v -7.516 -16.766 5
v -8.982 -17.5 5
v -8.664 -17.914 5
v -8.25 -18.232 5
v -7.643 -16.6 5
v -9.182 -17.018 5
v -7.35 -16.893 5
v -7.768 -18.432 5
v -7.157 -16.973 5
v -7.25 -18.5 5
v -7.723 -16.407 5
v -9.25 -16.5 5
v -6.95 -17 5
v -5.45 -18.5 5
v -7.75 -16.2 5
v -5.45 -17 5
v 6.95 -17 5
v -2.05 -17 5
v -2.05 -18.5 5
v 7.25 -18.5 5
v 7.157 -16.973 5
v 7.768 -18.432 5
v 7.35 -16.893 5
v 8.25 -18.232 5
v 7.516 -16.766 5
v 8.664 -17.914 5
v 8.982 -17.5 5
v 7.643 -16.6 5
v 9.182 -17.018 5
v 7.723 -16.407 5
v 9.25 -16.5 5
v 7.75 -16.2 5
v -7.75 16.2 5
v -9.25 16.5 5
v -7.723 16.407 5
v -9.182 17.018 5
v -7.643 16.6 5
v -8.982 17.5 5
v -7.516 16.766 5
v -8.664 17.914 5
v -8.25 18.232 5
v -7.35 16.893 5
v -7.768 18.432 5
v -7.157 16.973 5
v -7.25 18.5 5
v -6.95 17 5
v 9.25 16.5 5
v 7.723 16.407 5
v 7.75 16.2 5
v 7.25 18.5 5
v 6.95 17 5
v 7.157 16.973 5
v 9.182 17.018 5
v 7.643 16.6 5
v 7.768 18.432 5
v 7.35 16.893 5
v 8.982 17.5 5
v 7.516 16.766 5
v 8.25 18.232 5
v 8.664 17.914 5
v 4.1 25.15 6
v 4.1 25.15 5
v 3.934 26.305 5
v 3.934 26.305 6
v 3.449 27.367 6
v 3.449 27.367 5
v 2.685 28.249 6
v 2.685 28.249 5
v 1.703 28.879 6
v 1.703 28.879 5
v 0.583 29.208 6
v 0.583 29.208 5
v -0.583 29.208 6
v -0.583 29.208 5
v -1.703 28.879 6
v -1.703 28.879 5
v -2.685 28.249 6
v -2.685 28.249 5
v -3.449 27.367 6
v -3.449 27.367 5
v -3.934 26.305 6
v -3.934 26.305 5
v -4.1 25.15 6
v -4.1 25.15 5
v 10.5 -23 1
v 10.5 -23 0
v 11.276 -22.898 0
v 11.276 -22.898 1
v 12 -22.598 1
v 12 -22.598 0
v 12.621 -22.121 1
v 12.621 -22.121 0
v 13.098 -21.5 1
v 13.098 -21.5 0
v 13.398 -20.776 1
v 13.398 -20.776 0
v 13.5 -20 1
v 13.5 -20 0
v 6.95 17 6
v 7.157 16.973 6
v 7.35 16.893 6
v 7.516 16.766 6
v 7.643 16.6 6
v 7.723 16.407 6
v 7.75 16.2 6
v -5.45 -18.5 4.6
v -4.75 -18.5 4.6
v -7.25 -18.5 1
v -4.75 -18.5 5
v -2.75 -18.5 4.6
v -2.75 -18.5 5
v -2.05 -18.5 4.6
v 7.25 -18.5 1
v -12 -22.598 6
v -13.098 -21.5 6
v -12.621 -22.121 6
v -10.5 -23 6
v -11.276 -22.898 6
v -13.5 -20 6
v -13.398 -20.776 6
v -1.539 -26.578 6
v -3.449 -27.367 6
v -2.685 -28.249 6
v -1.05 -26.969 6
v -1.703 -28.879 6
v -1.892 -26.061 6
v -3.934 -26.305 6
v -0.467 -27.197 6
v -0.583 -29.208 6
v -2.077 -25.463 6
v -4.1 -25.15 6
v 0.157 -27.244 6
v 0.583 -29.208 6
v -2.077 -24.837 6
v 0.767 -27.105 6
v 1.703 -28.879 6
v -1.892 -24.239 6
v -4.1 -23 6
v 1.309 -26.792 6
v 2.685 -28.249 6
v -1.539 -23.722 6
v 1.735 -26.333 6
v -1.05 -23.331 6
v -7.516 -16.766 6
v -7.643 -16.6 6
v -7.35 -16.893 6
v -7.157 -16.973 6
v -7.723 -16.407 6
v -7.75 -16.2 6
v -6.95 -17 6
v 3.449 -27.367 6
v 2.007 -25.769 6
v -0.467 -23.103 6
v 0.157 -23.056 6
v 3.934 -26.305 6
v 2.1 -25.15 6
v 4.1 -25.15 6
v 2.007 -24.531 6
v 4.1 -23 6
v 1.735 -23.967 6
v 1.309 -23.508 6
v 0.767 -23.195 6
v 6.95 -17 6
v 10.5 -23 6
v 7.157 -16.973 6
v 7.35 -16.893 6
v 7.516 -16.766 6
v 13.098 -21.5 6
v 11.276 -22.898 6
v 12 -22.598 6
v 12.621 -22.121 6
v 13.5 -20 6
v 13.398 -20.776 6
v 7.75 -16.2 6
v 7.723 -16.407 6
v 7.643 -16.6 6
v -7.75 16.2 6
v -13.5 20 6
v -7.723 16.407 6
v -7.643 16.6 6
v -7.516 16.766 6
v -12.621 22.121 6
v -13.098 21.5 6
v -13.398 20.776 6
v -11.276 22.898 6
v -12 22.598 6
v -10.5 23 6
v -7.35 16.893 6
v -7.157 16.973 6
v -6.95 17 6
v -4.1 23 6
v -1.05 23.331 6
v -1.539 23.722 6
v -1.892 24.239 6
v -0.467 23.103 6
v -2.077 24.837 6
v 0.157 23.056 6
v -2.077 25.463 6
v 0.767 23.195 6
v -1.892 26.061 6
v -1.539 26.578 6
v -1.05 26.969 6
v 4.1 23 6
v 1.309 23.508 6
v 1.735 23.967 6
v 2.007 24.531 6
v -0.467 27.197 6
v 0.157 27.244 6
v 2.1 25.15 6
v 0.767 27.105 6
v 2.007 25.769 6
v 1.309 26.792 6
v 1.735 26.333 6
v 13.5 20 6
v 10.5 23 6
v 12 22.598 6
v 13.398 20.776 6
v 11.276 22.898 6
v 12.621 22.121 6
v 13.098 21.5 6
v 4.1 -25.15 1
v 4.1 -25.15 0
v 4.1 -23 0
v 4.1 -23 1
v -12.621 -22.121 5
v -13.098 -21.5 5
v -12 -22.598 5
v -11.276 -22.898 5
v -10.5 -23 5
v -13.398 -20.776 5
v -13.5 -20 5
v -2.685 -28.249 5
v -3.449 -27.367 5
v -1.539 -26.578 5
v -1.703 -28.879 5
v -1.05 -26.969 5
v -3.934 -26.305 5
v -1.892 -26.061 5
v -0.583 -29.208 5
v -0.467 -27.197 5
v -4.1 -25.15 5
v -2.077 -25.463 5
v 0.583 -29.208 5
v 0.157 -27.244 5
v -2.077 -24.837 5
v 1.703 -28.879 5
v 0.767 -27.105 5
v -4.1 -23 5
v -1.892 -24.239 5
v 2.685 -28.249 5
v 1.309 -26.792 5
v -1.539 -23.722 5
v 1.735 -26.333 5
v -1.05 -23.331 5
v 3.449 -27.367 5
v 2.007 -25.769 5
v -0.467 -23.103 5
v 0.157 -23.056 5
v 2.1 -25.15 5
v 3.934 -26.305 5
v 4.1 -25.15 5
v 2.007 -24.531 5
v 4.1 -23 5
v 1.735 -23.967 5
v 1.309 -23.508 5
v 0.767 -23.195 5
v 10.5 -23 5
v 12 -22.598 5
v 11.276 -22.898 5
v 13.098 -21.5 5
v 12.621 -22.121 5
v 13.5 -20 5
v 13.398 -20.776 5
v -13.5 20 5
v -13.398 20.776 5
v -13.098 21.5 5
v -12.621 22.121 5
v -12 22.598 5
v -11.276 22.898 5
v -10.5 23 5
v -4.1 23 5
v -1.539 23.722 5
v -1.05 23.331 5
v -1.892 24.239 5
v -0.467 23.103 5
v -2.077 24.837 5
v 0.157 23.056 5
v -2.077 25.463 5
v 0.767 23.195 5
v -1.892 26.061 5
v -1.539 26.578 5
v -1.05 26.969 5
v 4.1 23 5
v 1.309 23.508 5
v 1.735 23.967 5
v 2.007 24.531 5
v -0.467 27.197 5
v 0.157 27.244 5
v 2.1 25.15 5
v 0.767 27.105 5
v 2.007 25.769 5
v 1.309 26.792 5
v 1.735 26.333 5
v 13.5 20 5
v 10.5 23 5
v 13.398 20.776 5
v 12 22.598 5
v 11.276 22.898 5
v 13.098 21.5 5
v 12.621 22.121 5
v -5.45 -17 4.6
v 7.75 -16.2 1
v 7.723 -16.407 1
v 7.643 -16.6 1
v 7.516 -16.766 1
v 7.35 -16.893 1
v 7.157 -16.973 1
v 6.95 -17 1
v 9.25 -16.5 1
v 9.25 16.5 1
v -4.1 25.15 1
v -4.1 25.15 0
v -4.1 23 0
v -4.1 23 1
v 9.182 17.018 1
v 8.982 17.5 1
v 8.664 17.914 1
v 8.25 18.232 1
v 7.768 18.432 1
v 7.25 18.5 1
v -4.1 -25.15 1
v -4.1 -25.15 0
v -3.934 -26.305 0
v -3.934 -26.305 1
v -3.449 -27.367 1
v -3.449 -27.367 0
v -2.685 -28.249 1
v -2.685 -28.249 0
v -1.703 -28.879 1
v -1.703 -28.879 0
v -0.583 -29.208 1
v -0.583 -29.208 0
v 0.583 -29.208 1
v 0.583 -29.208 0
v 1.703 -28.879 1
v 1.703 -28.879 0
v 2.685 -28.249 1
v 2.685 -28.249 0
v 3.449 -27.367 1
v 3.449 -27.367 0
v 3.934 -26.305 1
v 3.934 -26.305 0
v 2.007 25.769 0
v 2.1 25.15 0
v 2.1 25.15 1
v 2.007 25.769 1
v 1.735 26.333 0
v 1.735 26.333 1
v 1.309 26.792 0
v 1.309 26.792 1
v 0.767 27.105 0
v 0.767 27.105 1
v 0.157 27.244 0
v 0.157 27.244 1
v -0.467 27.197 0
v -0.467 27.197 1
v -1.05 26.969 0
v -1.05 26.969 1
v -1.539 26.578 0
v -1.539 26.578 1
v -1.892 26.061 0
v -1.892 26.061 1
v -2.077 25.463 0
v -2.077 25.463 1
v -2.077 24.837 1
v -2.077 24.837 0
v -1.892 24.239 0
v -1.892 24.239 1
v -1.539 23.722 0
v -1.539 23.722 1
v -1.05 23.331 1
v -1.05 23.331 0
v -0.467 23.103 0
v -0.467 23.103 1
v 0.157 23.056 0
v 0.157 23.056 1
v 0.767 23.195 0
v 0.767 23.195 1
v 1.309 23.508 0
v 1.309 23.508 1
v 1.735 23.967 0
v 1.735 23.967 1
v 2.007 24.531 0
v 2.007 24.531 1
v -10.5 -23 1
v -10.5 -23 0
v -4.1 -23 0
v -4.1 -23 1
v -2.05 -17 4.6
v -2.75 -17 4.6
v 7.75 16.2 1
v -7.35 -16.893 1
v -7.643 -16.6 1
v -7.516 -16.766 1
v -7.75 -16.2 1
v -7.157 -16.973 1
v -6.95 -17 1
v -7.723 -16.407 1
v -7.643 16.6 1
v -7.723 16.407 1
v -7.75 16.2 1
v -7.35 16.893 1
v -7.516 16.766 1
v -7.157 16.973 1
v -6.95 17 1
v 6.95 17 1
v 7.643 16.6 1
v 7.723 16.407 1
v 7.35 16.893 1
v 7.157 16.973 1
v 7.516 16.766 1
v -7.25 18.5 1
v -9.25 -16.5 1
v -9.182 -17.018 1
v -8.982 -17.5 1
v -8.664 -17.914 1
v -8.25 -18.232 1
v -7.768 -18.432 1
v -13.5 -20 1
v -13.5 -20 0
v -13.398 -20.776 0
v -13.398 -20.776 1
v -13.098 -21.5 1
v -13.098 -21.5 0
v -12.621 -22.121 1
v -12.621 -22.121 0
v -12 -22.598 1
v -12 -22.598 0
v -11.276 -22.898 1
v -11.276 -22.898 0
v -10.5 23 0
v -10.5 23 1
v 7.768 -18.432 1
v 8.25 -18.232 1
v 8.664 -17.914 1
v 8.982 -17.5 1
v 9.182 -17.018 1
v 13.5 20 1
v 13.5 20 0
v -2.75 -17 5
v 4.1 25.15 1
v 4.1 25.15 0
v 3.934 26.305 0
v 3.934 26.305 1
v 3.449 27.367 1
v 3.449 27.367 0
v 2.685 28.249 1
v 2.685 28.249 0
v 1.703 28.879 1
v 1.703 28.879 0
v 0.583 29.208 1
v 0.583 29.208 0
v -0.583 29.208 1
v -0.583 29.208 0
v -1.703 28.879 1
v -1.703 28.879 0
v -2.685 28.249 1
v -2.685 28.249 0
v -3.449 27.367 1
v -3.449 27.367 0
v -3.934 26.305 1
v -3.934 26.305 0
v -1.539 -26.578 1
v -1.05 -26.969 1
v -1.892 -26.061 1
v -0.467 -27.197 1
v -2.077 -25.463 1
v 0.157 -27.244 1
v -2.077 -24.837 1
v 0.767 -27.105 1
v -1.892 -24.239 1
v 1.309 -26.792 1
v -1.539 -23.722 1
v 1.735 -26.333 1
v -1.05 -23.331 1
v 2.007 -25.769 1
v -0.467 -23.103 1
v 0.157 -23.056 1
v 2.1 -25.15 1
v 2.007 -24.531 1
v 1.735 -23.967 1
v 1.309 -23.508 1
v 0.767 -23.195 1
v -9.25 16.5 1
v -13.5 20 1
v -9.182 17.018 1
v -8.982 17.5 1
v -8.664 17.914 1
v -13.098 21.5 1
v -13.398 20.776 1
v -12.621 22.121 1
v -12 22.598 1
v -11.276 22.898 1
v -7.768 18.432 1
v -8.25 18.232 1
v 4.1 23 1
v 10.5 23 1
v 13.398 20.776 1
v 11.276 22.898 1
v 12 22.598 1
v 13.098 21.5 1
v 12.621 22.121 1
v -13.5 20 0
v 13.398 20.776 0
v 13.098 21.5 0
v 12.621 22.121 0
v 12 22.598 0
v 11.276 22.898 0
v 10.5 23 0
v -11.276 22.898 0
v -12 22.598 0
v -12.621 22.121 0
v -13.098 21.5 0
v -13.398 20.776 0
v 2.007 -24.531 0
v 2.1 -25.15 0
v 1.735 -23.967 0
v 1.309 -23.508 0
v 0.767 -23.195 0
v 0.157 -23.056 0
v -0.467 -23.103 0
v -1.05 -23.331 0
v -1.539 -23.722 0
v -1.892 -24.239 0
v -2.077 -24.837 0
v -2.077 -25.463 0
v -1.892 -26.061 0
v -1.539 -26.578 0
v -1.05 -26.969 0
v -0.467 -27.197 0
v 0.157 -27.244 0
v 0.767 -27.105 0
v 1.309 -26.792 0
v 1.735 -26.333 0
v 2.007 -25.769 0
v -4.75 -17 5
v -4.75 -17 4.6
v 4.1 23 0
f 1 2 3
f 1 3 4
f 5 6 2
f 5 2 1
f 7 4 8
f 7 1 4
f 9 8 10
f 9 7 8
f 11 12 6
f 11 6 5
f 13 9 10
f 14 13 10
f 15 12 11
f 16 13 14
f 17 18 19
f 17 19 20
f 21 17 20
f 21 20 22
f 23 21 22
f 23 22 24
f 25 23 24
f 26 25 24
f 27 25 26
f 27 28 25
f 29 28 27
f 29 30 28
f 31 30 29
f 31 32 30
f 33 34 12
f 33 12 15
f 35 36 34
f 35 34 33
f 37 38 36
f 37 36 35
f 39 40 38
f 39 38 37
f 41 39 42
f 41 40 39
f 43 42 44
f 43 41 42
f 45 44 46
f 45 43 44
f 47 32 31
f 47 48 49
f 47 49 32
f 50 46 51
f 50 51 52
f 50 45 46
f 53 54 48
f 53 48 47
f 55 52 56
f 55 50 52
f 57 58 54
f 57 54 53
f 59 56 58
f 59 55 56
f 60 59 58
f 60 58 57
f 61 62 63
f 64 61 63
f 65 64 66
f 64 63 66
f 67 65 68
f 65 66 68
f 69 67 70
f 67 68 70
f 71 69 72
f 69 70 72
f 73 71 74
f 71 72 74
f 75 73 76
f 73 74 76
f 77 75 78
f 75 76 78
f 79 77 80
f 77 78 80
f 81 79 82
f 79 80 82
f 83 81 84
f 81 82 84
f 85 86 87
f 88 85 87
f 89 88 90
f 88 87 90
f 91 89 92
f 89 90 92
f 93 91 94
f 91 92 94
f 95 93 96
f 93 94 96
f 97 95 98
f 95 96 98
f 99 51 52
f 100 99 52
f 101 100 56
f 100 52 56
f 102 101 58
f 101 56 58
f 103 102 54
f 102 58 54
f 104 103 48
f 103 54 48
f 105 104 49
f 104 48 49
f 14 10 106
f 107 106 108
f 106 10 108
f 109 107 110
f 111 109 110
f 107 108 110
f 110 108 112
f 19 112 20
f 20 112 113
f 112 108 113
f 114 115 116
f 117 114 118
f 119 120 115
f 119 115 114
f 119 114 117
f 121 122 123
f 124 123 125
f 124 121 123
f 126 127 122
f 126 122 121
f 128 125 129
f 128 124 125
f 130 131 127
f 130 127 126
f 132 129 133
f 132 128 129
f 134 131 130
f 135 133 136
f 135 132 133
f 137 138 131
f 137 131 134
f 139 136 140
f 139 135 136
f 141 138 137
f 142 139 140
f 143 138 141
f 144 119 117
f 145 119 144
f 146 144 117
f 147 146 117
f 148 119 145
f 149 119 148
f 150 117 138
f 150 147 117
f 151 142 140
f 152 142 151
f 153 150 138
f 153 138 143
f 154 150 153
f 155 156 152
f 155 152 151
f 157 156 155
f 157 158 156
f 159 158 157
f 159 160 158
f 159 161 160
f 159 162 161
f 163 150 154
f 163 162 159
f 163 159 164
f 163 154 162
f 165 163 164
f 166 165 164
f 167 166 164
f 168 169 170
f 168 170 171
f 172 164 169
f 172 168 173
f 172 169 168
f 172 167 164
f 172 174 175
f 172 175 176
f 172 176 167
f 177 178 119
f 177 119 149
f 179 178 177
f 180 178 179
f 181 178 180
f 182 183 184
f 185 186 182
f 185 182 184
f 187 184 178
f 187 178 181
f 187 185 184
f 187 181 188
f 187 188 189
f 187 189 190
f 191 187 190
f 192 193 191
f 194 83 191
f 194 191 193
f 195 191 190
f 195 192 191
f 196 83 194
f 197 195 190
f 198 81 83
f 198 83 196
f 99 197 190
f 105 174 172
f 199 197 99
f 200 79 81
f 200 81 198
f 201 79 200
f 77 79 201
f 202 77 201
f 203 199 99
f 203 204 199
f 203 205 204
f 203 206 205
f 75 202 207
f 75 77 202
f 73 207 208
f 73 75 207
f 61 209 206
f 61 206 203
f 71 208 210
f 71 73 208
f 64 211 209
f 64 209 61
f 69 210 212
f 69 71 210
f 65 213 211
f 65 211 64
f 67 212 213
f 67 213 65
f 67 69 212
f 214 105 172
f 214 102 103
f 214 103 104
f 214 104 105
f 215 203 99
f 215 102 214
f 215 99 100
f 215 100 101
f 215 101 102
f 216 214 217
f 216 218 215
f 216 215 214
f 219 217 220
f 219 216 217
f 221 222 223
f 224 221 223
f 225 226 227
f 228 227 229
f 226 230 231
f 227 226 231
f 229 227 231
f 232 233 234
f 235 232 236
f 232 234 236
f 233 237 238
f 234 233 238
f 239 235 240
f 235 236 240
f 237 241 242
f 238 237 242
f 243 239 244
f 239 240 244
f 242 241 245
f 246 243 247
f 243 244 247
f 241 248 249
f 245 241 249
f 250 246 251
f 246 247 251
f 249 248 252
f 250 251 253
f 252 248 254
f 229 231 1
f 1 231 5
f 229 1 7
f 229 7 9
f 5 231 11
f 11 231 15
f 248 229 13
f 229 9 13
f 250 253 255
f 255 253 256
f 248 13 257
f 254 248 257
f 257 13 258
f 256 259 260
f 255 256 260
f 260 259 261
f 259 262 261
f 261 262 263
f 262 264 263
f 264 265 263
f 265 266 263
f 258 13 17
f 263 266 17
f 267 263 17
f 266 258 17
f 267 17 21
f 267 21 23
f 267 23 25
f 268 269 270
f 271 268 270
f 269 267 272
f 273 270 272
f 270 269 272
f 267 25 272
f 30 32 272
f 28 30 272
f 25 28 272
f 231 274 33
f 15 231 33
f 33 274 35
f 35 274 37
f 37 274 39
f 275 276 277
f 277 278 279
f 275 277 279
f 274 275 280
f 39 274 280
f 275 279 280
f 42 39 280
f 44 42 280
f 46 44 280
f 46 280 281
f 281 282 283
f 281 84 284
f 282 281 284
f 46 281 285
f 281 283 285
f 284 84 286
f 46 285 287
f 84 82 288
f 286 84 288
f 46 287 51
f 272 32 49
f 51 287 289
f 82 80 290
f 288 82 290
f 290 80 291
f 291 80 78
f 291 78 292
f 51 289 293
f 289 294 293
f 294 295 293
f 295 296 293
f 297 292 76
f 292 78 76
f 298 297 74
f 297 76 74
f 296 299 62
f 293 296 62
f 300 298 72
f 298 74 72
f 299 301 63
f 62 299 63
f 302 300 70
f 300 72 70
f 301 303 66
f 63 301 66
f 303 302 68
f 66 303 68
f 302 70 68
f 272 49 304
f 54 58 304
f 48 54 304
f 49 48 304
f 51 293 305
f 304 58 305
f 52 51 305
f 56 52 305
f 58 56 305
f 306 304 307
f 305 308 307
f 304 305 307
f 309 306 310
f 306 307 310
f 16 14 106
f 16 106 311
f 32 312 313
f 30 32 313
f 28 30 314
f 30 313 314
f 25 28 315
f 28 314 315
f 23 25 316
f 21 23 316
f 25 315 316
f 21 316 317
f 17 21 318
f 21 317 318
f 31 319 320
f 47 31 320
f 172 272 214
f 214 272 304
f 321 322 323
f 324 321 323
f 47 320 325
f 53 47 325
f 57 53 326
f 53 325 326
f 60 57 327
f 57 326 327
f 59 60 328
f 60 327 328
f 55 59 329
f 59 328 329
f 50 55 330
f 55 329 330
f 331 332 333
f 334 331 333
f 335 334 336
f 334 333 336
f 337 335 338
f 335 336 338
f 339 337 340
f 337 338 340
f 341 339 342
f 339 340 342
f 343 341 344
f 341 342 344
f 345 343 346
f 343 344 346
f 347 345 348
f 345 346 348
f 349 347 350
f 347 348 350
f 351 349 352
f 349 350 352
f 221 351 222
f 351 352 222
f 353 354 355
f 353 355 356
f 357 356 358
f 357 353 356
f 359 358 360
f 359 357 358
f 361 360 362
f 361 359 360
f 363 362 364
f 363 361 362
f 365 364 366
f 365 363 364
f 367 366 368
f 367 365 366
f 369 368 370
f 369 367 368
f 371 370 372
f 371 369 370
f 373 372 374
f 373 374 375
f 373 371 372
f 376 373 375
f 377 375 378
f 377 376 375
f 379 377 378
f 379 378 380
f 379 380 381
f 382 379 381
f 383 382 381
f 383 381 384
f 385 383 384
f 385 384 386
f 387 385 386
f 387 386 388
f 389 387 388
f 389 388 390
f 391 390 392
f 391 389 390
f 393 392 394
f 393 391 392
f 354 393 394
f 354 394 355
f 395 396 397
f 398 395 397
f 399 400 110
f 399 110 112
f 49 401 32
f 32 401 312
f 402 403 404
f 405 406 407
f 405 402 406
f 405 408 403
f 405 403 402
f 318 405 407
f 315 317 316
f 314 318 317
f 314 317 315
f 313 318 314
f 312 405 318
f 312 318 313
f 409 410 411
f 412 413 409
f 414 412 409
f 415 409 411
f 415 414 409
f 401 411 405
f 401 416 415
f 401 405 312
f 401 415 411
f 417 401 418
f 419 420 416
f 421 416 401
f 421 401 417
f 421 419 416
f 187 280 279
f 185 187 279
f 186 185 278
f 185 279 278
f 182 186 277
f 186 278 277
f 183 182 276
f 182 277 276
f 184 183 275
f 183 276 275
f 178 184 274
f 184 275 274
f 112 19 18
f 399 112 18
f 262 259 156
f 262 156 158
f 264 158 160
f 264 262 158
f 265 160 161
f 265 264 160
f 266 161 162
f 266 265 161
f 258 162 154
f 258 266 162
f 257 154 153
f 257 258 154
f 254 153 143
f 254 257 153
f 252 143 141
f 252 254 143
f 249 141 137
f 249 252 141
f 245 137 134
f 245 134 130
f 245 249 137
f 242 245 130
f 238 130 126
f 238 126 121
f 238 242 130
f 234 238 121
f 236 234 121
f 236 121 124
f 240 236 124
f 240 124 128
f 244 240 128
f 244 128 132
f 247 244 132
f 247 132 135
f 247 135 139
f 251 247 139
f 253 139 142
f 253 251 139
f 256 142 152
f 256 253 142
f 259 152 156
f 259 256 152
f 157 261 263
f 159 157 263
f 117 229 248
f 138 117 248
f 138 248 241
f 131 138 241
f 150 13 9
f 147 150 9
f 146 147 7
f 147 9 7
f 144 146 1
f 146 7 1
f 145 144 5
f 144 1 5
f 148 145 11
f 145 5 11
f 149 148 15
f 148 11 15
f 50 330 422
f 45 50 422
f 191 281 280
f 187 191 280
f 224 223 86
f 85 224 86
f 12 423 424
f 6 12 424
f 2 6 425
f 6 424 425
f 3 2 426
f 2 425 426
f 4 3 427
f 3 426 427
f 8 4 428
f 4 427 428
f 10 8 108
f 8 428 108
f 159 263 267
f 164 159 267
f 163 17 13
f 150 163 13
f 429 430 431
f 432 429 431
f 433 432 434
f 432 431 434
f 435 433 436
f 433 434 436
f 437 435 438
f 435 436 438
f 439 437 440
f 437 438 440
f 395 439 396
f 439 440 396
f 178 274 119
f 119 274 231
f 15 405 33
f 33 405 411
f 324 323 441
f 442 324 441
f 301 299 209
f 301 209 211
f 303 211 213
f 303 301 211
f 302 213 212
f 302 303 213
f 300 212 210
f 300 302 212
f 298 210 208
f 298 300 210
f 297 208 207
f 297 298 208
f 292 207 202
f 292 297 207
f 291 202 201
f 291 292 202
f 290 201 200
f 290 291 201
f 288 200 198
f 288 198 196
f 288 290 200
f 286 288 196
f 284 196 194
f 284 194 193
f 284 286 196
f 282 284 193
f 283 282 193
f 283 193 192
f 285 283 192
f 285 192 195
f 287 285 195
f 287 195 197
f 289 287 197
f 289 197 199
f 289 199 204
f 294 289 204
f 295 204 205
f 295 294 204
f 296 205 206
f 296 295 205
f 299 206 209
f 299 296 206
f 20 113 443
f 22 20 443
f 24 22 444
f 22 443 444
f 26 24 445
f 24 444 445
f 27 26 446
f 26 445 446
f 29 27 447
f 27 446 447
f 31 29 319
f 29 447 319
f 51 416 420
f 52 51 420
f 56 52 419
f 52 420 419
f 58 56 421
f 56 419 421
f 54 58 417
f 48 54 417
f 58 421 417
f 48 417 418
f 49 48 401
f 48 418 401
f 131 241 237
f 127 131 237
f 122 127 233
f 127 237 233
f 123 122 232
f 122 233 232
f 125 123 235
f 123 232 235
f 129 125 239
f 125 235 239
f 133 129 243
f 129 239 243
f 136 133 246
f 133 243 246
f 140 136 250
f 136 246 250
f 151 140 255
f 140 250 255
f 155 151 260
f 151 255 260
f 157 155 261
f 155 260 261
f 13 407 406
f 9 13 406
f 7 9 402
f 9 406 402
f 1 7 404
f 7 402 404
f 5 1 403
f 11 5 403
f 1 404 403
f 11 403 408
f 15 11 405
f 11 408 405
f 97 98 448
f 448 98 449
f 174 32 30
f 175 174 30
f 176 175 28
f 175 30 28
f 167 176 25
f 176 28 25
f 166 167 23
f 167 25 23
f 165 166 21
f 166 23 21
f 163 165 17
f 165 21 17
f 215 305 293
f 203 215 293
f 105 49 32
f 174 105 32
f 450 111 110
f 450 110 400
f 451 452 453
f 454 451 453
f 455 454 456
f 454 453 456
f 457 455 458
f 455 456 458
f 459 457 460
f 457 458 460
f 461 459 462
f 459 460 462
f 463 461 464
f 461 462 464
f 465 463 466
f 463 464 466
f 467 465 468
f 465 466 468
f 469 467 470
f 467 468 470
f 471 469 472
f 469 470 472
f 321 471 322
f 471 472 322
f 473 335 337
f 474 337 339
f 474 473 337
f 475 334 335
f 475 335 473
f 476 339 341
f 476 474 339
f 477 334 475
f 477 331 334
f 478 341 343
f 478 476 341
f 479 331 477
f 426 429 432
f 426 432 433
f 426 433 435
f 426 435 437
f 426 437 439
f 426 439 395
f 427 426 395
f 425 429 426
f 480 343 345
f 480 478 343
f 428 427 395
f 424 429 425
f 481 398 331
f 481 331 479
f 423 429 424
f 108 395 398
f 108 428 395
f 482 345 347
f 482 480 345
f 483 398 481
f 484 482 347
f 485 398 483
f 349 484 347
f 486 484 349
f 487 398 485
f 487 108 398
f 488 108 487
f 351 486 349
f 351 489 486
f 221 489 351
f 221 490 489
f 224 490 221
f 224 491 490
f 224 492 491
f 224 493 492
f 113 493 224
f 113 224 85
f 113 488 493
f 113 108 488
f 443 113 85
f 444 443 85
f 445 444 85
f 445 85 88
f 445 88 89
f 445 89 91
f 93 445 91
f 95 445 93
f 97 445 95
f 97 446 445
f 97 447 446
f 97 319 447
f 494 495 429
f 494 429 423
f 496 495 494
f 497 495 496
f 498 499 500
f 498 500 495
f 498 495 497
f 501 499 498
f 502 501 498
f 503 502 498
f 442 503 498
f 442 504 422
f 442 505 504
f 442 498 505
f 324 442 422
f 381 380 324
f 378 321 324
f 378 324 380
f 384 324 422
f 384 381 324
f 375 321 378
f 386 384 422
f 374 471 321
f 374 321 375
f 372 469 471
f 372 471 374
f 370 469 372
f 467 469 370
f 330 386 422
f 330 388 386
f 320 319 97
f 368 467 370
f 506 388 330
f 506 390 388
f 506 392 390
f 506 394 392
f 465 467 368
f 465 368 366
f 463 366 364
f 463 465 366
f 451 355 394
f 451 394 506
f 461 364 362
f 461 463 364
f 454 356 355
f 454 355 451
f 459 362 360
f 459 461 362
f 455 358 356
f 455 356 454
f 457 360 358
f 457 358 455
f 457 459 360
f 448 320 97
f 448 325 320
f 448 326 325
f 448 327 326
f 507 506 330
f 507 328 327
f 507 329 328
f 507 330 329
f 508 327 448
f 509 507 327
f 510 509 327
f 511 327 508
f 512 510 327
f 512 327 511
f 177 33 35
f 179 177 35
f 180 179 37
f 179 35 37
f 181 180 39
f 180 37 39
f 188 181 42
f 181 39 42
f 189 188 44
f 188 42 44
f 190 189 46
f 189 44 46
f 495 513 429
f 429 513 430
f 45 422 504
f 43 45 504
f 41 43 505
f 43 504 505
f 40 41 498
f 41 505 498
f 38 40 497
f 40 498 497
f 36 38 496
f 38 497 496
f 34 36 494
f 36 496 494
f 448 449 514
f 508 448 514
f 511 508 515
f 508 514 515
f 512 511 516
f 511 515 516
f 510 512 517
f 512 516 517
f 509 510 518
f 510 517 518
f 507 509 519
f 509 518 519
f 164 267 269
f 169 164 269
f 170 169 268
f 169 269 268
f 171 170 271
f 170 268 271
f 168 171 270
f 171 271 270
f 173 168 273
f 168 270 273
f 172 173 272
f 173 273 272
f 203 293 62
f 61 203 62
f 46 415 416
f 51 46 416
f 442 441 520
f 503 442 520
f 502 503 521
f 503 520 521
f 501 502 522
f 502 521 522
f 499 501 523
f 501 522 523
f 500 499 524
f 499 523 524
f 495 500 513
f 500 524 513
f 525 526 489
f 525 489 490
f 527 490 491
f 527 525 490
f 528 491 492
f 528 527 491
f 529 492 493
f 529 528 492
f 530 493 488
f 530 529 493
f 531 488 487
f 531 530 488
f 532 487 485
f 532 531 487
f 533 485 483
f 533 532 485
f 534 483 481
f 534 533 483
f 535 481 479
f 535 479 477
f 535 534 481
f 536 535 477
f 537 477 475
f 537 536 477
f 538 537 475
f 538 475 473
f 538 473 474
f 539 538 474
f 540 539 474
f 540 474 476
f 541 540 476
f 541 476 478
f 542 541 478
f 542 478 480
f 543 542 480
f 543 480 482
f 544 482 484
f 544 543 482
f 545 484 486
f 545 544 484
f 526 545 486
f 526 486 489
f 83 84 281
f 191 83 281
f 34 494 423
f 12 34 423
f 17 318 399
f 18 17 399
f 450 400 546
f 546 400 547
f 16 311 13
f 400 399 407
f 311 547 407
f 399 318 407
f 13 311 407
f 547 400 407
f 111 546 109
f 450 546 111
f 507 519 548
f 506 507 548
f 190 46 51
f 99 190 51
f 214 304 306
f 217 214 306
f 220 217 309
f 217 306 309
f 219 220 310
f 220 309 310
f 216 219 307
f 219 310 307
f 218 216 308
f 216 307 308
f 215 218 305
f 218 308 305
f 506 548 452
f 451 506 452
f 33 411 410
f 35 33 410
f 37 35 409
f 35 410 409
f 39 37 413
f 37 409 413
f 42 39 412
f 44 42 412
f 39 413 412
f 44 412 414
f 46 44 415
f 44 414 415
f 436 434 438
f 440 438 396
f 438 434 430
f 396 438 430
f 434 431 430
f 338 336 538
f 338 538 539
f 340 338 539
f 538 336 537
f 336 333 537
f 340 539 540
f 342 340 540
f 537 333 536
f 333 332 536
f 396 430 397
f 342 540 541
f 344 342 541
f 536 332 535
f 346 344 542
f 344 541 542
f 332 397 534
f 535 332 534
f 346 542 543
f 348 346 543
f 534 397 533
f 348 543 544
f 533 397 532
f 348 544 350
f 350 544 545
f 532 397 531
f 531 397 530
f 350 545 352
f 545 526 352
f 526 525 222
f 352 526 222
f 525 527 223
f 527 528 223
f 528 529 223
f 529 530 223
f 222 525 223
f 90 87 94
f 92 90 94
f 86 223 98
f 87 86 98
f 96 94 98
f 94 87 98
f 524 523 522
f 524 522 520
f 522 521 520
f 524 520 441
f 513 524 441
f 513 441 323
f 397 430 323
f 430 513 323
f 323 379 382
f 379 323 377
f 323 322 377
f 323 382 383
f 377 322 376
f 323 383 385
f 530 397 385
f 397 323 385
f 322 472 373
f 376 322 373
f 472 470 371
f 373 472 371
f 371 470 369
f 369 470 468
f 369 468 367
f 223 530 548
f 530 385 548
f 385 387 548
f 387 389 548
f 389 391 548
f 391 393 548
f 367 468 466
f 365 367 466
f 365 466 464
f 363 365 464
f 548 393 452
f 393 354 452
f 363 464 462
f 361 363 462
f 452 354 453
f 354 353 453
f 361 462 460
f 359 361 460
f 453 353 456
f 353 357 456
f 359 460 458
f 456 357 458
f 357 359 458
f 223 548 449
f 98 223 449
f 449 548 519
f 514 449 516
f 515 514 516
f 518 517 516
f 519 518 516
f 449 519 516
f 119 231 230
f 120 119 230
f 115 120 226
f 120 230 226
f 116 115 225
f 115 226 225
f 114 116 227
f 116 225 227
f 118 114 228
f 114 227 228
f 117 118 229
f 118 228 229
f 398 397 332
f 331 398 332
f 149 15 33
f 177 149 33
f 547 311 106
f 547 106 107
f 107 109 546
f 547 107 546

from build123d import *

# Parameters (mm, degrees)
F0_R     = 2.1
F1_DEPTH = 1
F3_DEPTH = 4
F4_R     = 2.1
F5_DEPTH = 1
F6_W     = 0.7
F6_H     = 1.5
F7_DEPTH = 0.4


with BuildPart() as f1:
    # F0 (on Top) → F1 (new body)
    with BuildSketch(Plane.XY):
        with BuildLine():
            ThreePointArc((13.5, 20), (12.62132, 22.12132), (10.5, 23))
            Line((10.5, 23), (4.1, 23))
            Line((4.1, 23), (4.1, 25.15))
            ThreePointArc((4.1, 25.15), (0, 29.25), (-4.1, 25.15))
            Line((-4.1, 25.15), (-4.1, 23))
            Line((-4.1, 23), (-10.5, 23))
            ThreePointArc((-10.5, 23), (-12.62132, 22.12132), (-13.5, 20))
            Line((-13.5, 20), (-13.5, -20))
            ThreePointArc((-13.5, -20), (-12.62132, -22.12132), (-10.5, -23))
            Line((-10.5, -23), (-4.1, -23))
            Line((-4.1, -23), (-4.1, -25.15))
            ThreePointArc((-4.1, -25.15), (0, -29.25), (4.1, -25.15))
            Line((4.1, -25.15), (4.1, -23))
            Line((4.1, -23), (10.5, -23))
            ThreePointArc((10.5, -23), (12.62132, -22.12132), (13.5, -20))
            Line((13.5, -20), (13.5, 20))
        make_face()
        with Locations((0, -25.15)):
            Circle(F0_R, mode=Mode.SUBTRACT)
        with Locations((0, 25.15)):
            Circle(F0_R, mode=Mode.SUBTRACT)
    extrude(amount=F1_DEPTH)

    # F2 (on face) → F3 (join)
    with BuildSketch(Plane.XY.offset(1)):
        with BuildLine():
            ThreePointArc((-7.25, 18.5), (-8.664214, 17.914214), (-9.25, 16.5))
            Line((-9.25, 16.5), (-9.25, -16.5))
            ThreePointArc((-9.25, -16.5), (-8.664214, -17.914214), (-7.25, -18.5))
            Line((-7.25, -18.5), (7.25, -18.5))
            ThreePointArc((7.25, -18.5), (8.664214, -17.914214), (9.25, -16.5))
            Line((9.25, -16.5), (9.25, 16.5))
            ThreePointArc((9.25, 16.5), (8.664214, 17.914214), (7.25, 18.5))
            Line((7.25, 18.5), (-7.25, 18.5))
        make_face()
        with BuildLine():
            Line((-6.95, 17), (6.95, 17))
            ThreePointArc((6.95, 17), (7.515685, 16.765685), (7.75, 16.2))
            Line((7.75, 16.2), (7.75, -16.2))
            ThreePointArc((7.75, -16.2), (7.515685, -16.765685), (6.95, -17))
            Line((6.95, -17), (-6.95, -17))
            ThreePointArc((-6.95, -17), (-7.515685, -16.765685), (-7.75, -16.2))
            Line((-7.75, -16.2), (-7.75, 16.2))
            ThreePointArc((-7.75, 16.2), (-7.515685, 16.765685), (-6.95, 17))
        make_face(mode=Mode.SUBTRACT)
    extrude(amount=F3_DEPTH)

    # F6 (on face) → F7 (cut)
    with BuildSketch(Plane.XY.offset(5)):
        with Locations((-5.1, -17.75)):
            Rectangle(F6_W, F6_H)
        with Locations((-2.4, -17.75)):
            Rectangle(F6_W, F6_H)
    extrude(amount=-F7_DEPTH, mode=Mode.SUBTRACT)


with BuildPart() as f5:
    # F4 (on face) → F5 (new body)
    with BuildSketch(Plane.XY.offset(5)):
        with BuildLine():
            ThreePointArc((-10.5, 23), (-12.62132, 22.12132), (-13.5, 20))
            Line((-13.5, 20), (-13.5, -20))
            ThreePointArc((-13.5, -20), (-12.62132, -22.12132), (-10.5, -23))
            Line((-10.5, -23), (-4.1, -23))
            Line((-4.1, -23), (-4.1, -25.15))
            ThreePointArc((-4.1, -25.15), (0, -29.25), (4.1, -25.15))
            Line((4.1, -25.15), (4.1, -23))
            Line((4.1, -23), (10.5, -23))
            ThreePointArc((10.5, -23), (12.62132, -22.12132), (13.5, -20))
            Line((13.5, -20), (13.5, 20))
            ThreePointArc((13.5, 20), (12.62132, 22.12132), (10.5, 23))
            Line((10.5, 23), (4.1, 23))
            Line((4.1, 23), (4.1, 25.15))
            ThreePointArc((4.1, 25.15), (0, 29.25), (-4.1, 25.15))
            Line((-4.1, 25.15), (-4.1, 23))
            Line((-4.1, 23), (-10.5, 23))
        make_face()
        with Locations((0, -25.15)):
            Circle(F4_R, mode=Mode.SUBTRACT)
        with BuildLine():
            Line((-6.95, 17), (6.95, 17))
            ThreePointArc((6.95, 17), (7.515685, 16.765685), (7.75, 16.2))
            Line((7.75, 16.2), (7.75, -16.2))
            ThreePointArc((7.75, -16.2), (7.515685, -16.765685), (6.95, -17))
            Line((6.95, -17), (-6.95, -17))
            ThreePointArc((-6.95, -17), (-7.515685, -16.765685), (-7.75, -16.2))
            Line((-7.75, -16.2), (-7.75, 16.2))
            ThreePointArc((-7.75, 16.2), (-7.515685, 16.765685), (-6.95, 17))
        make_face(mode=Mode.SUBTRACT)
        with Locations((0, 25.15)):
            Circle(F4_R, mode=Mode.SUBTRACT)
    extrude(amount=F5_DEPTH)


solid = Compound([f1.part, f5.part])
